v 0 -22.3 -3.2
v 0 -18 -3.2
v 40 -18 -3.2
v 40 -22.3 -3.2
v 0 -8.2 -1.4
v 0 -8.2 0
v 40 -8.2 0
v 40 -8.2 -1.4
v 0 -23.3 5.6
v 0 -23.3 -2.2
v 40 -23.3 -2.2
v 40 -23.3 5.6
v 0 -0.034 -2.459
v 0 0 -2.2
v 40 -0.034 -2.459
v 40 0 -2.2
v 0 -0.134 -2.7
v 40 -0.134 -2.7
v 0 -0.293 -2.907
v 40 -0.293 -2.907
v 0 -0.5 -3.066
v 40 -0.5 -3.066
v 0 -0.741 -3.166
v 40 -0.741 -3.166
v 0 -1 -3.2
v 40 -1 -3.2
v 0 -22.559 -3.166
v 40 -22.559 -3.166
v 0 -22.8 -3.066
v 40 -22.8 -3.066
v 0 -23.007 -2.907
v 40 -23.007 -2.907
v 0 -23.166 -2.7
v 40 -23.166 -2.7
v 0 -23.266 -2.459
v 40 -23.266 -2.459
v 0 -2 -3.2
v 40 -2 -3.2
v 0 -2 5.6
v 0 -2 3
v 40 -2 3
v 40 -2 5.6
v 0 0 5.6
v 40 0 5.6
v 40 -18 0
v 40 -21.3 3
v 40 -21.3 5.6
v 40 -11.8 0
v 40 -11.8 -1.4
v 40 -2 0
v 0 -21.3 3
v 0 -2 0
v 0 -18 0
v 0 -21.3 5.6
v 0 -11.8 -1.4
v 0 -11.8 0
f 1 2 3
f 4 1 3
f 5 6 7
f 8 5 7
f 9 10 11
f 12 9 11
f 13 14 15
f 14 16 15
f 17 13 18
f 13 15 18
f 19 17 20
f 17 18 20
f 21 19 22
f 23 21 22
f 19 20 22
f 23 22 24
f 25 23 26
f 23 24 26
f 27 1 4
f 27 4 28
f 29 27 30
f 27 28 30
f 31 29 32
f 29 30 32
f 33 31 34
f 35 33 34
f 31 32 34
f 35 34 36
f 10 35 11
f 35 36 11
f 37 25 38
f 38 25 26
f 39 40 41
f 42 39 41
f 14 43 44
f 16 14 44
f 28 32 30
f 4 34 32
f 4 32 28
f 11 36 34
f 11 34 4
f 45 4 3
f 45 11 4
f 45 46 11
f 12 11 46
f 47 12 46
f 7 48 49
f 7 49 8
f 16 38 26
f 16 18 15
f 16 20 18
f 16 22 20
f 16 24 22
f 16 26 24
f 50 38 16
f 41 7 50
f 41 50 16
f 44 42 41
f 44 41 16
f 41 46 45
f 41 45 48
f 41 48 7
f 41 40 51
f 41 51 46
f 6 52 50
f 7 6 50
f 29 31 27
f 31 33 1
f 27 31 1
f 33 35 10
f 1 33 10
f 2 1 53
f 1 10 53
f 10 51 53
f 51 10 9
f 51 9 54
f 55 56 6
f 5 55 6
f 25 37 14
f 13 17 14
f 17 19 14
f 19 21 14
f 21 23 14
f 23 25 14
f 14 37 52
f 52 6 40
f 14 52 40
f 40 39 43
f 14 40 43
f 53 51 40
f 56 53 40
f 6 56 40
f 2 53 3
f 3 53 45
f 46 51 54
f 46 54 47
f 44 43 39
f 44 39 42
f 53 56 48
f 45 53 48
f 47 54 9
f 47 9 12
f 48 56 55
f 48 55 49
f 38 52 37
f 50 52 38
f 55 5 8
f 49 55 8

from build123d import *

# Parameters (mm, degrees)
F0_W     = 40
F0_H     = 19.3
F1_DEPTH = 3
F0_H_2   = 2
F2_DEPTH = 5.6
F3_W     = 40
F3_H     = 5.3
F4_DEPTH = 3.2
F5_R     = 1
F3_H_2   = 1.8
F6_DEPTH = 1.4


with BuildPart() as f1:
    # F0 (on Top) → F1 (new body)
    with BuildSketch(Plane.XY):
        with Locations((20, -11.65)):
            Rectangle(F0_W, F0_H)
    extrude(amount=F1_DEPTH)

    # F0 (on Top) → F2 (join)
    with BuildSketch(Plane.XY):
        with Locations((20, -22.3)):
            Rectangle(F0_W, F0_H_2)
        with Locations((20, -1)):
            Rectangle(F0_W, F0_H_2)
    extrude(amount=F2_DEPTH)

    # F0 (on Top) + F3 (on Top) → F4 (join)
    with BuildSketch(Plane.XY):
        with Locations((20, -1)):
            Rectangle(F0_W, F0_H_2)
    with BuildSketch(Plane.XY):
        with Locations((20, -20.65)):
            Rectangle(F3_W, F3_H)
    extrude(amount=-F4_DEPTH)

    # F5
    f5_edges = [f1.edges().sort_by_distance(p)[0] for p in [
        (20, -23.3, -3.2),
        (20, 0, -3.2),
    ]]
    fillet(f5_edges, radius=F5_R)

    # F3 (on Top) → F6 (join)
    with BuildSketch(Plane.XY):
        with Locations((20, -9.1)):
            Rectangle(F3_W, F3_H_2)
        with Locations((20, -10.9)):
            Rectangle(F3_W, F3_H_2)
    extrude(amount=-F6_DEPTH)


solid = f1.part
